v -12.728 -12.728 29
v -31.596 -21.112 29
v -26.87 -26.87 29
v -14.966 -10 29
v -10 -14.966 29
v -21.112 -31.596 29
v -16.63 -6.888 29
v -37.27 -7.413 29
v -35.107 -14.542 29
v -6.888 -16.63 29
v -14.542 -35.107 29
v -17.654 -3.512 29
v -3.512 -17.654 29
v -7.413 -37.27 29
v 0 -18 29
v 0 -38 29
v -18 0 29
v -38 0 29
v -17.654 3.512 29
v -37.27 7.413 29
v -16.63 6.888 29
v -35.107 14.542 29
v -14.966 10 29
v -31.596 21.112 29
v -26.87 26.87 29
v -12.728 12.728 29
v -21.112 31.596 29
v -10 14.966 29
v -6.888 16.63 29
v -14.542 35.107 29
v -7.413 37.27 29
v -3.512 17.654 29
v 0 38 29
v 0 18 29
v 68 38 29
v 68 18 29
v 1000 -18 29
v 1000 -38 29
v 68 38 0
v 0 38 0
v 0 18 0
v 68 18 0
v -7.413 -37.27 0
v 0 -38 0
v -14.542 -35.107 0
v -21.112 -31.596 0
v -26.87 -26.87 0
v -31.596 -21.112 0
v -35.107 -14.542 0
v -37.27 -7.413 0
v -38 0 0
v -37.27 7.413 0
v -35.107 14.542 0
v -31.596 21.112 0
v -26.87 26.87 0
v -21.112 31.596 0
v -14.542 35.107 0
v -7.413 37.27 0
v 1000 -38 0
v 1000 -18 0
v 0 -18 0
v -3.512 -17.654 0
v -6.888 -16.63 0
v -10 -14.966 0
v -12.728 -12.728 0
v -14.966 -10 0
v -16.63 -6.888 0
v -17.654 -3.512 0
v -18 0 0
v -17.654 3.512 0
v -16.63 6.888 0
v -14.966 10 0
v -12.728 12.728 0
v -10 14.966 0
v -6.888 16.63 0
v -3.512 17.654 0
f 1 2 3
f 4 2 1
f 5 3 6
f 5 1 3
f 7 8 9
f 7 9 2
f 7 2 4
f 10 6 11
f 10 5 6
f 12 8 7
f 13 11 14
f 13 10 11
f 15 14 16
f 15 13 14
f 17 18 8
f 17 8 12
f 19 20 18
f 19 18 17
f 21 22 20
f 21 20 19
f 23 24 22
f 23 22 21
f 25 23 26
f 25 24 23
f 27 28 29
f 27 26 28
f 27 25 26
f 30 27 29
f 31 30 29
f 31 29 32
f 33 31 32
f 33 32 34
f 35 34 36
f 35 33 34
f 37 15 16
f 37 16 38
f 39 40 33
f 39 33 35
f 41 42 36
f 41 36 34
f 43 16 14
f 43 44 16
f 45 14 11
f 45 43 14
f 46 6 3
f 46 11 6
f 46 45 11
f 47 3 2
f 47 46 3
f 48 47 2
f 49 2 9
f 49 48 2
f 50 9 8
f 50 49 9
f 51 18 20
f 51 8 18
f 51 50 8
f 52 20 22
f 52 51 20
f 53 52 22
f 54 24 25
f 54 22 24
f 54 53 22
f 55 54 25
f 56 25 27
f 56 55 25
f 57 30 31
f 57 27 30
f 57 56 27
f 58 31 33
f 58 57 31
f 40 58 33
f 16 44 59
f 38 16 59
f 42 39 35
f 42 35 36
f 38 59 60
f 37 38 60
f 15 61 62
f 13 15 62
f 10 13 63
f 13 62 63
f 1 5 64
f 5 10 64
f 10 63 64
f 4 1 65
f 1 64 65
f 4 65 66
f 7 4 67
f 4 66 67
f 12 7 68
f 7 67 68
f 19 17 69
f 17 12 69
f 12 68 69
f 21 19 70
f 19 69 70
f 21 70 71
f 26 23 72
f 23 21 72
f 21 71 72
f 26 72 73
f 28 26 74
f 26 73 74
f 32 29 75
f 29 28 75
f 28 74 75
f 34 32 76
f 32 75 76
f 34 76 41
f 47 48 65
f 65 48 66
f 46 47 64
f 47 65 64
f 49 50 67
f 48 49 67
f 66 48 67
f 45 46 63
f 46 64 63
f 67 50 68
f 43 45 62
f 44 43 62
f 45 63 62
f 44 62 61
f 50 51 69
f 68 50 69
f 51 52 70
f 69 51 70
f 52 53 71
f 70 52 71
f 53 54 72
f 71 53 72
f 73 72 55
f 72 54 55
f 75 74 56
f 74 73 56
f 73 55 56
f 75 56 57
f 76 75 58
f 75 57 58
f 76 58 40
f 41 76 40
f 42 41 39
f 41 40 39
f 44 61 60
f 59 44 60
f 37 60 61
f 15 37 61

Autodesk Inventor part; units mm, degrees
ref_plane "YZ Plane" through (0, 0, 0) normal (1, 0, 0) x (0, 1, 0)
ref_plane "XZ Plane" through (0, 0, 0) normal (0, 1, 0) x (-1, 0, 0)
ref_plane "XY Plane" through (0, 0, 0) normal (0, 0, 1) x (1, 0, 0)
sketch "Sketch1" plane through (0, 0, 0) normal (0, 0, 1) x (1, 0, 0)
  circle A0 centre (0, 0) radius 38
  line L0 (0, -38) -> (1000, -38)
  line L1 (1000, -38) -> (1000, -18)
  line L2 (1000, -18) -> (0, -18)
  line L3 (0, -18) -> (0, -38)
  line L4 (0, 38) -> (68, 38)
  line L5 (68, 38) -> (68, 18)
  line L6 (68, 18) -> (0, 18)
  line L7 (0, 18) -> (0, 38)
  circle A1 centre (0, 0) radius 18
  dimension "d0" = 76
  dimension "d1" = 20
  dimension "d2" = 20
  dimension "d4" = 1000
  dimension "d7" = 68
extrude "Extrusion1" add sketch "Sketch1" along normal blind 29 contours L7 A1 L3 A0 | L4 L5 L6 A0 | A0 L6 L7 | L3 L2 A0 | A0 L2 L1 L0
properties part number "J15BF.1.20"
